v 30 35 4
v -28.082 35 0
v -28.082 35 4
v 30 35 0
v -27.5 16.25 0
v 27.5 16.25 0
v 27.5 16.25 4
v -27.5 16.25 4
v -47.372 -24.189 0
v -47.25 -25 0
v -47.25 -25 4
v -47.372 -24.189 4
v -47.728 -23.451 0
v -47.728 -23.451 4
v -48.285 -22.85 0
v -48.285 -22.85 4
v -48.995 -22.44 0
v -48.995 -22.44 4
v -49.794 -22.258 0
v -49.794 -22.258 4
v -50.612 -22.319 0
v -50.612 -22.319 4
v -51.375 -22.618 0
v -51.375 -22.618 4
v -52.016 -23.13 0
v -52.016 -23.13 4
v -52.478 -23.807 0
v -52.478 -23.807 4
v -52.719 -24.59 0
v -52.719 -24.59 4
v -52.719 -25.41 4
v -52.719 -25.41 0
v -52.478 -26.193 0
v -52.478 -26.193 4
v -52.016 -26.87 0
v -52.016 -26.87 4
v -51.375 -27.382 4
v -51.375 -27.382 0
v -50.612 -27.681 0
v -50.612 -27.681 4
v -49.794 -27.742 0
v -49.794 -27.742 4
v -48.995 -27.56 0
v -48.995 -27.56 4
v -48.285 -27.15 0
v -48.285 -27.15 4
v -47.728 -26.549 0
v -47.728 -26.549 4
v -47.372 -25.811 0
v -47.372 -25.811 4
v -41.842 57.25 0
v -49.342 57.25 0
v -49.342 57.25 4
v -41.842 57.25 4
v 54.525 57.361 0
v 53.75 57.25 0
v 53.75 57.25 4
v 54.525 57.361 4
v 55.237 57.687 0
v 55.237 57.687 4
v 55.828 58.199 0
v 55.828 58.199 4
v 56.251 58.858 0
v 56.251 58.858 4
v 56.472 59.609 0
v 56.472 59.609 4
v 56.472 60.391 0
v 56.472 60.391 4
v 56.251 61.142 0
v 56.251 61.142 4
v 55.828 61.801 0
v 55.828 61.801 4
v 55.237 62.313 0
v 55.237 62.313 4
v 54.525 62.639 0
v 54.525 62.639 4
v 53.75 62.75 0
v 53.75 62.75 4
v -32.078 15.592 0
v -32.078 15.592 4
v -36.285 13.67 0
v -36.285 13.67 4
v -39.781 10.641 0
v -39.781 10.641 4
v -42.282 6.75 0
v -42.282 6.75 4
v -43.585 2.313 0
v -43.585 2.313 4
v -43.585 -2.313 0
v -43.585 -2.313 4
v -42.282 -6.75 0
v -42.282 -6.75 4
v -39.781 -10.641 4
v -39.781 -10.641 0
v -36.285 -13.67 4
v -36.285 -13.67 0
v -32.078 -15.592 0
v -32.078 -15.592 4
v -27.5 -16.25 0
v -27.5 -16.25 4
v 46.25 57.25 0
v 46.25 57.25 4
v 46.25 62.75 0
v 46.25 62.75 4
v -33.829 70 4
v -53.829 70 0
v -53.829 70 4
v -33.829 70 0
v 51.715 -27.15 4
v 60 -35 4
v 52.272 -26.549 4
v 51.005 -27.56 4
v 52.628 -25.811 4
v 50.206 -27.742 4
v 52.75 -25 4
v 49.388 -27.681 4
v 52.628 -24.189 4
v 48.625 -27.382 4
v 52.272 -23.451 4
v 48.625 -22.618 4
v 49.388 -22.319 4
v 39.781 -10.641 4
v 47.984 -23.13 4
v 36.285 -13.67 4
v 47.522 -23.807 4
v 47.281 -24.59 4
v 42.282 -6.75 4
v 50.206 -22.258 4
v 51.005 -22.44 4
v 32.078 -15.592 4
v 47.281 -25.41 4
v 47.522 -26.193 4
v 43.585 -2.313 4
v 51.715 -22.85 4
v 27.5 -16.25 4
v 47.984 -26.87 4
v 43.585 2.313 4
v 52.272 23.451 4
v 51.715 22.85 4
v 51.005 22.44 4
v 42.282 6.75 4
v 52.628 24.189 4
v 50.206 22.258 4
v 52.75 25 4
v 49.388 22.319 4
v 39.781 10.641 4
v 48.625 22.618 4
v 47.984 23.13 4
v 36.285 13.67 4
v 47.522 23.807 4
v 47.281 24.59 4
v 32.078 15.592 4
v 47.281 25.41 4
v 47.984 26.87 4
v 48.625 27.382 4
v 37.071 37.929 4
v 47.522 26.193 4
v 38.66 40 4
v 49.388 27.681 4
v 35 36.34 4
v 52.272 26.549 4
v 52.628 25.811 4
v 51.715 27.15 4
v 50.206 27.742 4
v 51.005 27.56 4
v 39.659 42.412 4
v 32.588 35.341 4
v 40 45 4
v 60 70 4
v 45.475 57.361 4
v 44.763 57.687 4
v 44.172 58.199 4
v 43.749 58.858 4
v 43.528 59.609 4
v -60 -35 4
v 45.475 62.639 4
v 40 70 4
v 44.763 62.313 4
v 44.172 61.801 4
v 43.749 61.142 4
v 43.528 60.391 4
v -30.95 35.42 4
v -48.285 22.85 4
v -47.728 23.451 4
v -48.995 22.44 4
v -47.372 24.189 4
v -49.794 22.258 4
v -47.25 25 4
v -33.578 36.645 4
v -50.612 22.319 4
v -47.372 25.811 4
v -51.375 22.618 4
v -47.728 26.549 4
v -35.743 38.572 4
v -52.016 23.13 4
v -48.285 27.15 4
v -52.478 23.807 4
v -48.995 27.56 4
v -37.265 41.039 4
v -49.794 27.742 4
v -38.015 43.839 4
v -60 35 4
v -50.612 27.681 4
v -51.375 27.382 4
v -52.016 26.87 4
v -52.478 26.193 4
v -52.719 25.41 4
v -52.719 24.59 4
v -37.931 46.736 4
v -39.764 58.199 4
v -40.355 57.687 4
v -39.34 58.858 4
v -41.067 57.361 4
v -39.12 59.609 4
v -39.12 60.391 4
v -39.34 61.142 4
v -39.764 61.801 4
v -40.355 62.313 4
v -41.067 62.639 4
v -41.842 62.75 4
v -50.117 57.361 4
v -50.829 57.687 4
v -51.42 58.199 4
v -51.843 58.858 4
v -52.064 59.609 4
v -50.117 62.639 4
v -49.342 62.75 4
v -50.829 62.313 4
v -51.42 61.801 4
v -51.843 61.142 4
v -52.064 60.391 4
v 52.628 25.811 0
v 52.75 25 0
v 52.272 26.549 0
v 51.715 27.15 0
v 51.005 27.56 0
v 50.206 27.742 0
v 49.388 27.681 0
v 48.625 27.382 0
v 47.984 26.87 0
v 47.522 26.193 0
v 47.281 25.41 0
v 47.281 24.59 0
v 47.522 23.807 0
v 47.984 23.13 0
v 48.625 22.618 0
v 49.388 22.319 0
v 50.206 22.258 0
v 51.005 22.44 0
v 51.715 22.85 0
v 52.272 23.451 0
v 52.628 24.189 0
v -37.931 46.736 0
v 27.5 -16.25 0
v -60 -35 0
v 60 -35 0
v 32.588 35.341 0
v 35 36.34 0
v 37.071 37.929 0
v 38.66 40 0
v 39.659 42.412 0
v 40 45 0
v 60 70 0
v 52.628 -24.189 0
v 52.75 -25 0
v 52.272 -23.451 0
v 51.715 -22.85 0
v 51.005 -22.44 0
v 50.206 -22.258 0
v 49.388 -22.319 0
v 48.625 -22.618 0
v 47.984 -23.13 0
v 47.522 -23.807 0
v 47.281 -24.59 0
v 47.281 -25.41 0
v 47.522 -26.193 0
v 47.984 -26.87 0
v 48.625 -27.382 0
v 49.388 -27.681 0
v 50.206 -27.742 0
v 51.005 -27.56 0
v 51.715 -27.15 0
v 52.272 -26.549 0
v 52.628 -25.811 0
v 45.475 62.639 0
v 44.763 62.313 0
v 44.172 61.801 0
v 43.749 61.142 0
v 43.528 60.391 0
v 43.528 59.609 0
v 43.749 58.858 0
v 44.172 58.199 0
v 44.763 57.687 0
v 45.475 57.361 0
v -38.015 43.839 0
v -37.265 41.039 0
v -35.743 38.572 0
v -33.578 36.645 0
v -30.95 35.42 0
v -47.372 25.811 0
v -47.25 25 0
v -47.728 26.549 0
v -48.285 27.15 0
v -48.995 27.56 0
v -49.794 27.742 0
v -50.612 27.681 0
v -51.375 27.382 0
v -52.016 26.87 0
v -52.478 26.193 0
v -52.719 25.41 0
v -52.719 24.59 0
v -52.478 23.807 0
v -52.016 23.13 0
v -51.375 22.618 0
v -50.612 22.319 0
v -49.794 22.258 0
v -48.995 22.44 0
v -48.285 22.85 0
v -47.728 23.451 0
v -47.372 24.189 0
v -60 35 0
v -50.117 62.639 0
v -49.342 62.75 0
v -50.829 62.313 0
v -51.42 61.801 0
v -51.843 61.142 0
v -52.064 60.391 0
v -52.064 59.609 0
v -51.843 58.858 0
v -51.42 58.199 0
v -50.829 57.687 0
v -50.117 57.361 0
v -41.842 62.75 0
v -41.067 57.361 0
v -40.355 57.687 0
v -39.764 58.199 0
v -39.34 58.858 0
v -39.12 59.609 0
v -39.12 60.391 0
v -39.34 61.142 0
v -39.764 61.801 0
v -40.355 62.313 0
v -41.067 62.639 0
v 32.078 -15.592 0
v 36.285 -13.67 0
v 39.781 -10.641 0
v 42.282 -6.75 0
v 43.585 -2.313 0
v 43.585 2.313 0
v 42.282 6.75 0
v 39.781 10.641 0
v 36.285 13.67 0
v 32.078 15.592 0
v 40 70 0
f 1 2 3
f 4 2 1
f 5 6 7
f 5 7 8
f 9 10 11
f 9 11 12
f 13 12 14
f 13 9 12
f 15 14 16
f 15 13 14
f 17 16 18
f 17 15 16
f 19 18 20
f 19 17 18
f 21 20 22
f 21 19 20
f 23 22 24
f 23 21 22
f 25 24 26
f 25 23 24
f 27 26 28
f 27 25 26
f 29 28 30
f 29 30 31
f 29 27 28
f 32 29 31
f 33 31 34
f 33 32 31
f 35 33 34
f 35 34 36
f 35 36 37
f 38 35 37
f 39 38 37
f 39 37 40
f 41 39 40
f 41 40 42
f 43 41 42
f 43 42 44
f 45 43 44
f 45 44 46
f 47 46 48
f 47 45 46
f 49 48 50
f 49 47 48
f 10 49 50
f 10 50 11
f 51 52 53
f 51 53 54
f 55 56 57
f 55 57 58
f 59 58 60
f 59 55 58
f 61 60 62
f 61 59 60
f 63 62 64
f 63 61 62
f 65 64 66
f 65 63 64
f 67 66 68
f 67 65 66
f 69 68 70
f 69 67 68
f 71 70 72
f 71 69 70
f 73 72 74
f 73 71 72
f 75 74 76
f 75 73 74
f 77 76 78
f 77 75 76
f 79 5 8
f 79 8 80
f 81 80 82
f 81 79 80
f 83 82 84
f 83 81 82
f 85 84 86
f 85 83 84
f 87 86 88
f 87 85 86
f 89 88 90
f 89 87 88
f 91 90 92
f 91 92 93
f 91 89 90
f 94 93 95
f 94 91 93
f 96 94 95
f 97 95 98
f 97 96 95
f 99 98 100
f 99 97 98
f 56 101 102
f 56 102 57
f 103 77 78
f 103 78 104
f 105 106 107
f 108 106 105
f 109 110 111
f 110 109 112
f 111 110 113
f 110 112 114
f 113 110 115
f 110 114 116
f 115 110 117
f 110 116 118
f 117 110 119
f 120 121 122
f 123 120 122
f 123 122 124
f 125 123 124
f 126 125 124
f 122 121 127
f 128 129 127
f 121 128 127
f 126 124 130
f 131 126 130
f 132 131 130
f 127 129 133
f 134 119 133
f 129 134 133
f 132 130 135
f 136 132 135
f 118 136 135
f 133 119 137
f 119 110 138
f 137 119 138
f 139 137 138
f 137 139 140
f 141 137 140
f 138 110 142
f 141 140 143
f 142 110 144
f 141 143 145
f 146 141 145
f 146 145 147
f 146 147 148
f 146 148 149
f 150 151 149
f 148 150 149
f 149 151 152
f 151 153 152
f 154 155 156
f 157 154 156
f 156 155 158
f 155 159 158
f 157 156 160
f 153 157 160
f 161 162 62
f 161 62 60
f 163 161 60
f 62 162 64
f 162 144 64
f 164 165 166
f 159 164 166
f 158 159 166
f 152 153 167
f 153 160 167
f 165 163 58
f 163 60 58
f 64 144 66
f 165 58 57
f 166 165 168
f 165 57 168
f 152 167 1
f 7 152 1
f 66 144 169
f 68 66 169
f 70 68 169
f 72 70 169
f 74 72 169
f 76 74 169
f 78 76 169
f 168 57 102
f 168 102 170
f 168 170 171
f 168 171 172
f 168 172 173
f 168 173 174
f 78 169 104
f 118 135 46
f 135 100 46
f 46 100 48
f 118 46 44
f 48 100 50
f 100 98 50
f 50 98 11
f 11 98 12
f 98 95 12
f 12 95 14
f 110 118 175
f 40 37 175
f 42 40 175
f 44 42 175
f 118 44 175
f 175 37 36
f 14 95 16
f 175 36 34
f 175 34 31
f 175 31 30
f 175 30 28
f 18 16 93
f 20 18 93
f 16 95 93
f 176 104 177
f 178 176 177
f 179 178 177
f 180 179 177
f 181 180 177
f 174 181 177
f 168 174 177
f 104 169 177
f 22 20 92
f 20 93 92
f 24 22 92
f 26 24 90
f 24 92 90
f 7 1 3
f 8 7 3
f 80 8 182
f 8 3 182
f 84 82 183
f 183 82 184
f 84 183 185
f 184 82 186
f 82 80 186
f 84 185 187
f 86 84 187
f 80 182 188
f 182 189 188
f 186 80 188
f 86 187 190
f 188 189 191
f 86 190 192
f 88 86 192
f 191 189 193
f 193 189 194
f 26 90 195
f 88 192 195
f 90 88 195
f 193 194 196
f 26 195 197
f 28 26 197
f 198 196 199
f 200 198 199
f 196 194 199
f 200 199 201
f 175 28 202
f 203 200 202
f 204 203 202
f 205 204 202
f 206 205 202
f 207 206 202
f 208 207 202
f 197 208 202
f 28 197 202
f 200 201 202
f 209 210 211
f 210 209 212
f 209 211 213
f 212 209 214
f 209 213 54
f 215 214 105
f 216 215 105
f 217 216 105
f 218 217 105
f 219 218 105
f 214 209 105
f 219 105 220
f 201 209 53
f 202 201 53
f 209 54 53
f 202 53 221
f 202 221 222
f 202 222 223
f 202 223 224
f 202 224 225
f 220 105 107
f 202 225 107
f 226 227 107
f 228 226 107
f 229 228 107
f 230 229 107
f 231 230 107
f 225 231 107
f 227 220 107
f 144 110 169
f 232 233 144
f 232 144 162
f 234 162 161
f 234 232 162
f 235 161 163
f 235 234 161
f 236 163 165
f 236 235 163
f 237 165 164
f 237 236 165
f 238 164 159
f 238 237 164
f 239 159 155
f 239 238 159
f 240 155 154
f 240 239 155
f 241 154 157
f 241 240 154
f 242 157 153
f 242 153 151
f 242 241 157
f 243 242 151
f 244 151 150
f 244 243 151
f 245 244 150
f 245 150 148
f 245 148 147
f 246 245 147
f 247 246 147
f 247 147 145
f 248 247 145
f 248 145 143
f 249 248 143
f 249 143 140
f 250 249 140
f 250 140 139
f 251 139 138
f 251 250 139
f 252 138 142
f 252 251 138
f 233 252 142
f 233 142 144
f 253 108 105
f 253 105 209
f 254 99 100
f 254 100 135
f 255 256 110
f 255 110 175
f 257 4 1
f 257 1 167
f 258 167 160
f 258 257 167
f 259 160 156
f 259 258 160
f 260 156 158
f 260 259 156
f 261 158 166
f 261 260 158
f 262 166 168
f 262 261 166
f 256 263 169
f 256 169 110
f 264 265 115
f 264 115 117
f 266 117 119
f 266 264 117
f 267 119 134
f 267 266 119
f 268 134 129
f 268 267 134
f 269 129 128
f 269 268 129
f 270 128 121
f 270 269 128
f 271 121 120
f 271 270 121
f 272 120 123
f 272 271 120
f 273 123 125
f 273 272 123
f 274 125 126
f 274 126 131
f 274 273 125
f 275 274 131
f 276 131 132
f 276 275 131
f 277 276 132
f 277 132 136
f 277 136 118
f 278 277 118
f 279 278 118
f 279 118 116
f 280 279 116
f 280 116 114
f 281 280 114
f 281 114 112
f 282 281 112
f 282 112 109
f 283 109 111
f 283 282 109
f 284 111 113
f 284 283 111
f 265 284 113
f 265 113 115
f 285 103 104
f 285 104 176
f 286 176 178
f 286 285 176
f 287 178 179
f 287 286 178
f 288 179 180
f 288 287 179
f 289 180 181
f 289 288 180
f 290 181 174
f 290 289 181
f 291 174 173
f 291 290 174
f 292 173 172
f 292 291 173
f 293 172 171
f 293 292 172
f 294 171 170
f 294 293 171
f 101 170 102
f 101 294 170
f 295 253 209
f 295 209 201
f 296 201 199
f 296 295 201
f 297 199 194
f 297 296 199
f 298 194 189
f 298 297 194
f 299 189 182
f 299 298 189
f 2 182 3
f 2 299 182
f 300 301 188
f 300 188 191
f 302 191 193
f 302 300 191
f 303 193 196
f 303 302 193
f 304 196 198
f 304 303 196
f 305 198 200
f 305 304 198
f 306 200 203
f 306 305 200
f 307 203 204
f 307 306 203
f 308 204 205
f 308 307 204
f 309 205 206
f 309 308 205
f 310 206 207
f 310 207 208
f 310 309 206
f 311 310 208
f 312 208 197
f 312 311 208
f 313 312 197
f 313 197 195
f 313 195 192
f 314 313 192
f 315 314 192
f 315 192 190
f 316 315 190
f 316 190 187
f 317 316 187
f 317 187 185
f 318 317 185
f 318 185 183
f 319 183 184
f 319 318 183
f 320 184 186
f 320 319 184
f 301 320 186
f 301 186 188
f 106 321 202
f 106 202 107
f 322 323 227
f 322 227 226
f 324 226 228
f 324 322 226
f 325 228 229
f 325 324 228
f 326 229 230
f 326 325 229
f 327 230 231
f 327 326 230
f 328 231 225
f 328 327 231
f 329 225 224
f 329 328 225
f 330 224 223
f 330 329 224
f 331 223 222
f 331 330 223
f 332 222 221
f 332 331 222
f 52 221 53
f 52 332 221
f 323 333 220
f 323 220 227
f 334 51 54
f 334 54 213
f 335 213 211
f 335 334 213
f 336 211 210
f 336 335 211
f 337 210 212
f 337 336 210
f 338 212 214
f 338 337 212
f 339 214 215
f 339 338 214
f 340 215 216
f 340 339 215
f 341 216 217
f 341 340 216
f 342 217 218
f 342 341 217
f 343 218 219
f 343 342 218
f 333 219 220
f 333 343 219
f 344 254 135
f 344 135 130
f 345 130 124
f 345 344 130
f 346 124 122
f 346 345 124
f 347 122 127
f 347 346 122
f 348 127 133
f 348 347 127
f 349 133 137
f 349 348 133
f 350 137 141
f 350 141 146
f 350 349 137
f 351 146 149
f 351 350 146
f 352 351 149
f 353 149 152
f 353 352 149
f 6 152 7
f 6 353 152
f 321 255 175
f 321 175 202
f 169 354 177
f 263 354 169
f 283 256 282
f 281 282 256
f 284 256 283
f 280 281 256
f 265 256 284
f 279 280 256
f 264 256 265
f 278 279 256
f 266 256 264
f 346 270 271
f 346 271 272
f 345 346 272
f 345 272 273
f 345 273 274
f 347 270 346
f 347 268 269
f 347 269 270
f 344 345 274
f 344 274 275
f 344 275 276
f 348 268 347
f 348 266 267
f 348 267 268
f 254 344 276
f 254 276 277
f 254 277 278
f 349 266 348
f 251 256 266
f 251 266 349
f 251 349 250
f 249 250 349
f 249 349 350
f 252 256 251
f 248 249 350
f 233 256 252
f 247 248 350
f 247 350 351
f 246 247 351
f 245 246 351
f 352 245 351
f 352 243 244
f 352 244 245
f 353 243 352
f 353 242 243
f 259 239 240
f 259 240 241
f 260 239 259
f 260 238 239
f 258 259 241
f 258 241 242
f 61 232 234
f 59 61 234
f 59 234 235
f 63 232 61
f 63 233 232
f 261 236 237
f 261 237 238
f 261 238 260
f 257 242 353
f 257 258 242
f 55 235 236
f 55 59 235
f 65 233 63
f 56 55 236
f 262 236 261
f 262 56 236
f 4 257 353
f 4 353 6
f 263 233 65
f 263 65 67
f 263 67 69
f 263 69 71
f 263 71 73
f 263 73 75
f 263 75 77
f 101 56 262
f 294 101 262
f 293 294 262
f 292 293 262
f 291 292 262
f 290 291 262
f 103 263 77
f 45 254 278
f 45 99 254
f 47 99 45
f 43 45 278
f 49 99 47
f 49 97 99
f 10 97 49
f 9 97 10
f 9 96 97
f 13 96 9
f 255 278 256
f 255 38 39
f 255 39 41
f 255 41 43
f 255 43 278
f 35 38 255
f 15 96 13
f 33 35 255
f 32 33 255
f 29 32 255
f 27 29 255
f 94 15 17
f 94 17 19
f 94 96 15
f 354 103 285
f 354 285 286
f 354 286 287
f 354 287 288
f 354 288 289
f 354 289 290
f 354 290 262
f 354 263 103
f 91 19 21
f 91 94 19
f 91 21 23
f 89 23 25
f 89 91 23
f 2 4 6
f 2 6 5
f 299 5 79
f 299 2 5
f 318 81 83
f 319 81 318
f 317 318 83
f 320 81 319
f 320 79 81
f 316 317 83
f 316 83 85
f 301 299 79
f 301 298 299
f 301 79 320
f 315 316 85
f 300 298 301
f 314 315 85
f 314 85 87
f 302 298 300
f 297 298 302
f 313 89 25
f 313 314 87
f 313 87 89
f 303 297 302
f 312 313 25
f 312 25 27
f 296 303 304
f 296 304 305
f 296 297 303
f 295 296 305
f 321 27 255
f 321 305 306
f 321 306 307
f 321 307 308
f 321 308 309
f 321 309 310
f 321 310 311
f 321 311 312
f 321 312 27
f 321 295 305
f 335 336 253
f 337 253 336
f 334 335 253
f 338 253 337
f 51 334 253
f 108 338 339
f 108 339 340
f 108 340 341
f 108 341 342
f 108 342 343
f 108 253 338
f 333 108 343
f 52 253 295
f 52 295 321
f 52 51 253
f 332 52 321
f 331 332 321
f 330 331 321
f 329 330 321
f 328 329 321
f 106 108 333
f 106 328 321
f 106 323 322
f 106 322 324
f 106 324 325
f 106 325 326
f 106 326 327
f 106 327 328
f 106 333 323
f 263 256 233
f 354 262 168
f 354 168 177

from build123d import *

# Parameters (mm, degrees)
SKETCH1_R           = 2.75
BOSS_EXTRUDE1_DEPTH = 4


with BuildPart() as part:
    # Sketch1 → Boss-Extrude1 (new body)
    with BuildSketch(Plane.XY):
        with BuildLine():
            Line((-60, 35), (-53.828555675, 70))
            Line((-53.828555675, 70), (-33.828555675, 70))
            Line((-33.828555675, 70), (-37.930541604, 46.736481777))
            ThreePointArc((-37.930541604, 46.736481777), (-35.742908505, 38.572123903), (-28.082464074, 35))
            Line((-28.082464074, 35), (30, 35))
            ThreePointArc((30, 35), (37.071067812, 37.928932188), (40, 45))
            Line((40, 45), (40, 70))
            Line((40, 70), (60, 70))
            Line((60, 70), (60, 35))
            Line((60, 35), (60, -35))
            Line((60, -35), (-60, -35))
            Line((-60, -35), (-60, 35))
        make_face()
        with Locations((-50, 25)):
            Circle(SKETCH1_R, mode=Mode.SUBTRACT)
        with Locations((-50, -25)):
            Circle(SKETCH1_R, mode=Mode.SUBTRACT)
        with Locations((50, 25)):
            Circle(SKETCH1_R, mode=Mode.SUBTRACT)
        with Locations((50, -25)):
            Circle(SKETCH1_R, mode=Mode.SUBTRACT)
        with BuildLine():
            Line((-49.341825482, 57.25), (-41.841825482, 57.25))
            ThreePointArc((-41.841825482, 57.25), (-39.091825482, 60), (-41.841825482, 62.75))
            Line((-41.841825482, 62.75), (-49.341825482, 62.75))
            ThreePointArc((-49.341825482, 62.75), (-52.091825482, 60), (-49.341825482, 57.25))
        make_face(mode=Mode.SUBTRACT)
        with BuildLine():
            Line((-27.5, -16.25), (27.5, -16.25))
            ThreePointArc((27.5, -16.25), (43.75, 0), (27.5, 16.25))
            Line((27.5, 16.25), (-27.5, 16.25))
            ThreePointArc((-27.5, 16.25), (-43.75, 0), (-27.5, -16.25))
        make_face(mode=Mode.SUBTRACT)
        with BuildLine():
            Line((46.25, 57.25), (53.75, 57.25))
            ThreePointArc((53.75, 57.25), (56.5, 60), (53.75, 62.75))
            Line((53.75, 62.75), (46.25, 62.75))
            ThreePointArc((46.25, 62.75), (43.5, 60), (46.25, 57.25))
        make_face(mode=Mode.SUBTRACT)
    extrude(amount=BOSS_EXTRUDE1_DEPTH)


solid = part.part
